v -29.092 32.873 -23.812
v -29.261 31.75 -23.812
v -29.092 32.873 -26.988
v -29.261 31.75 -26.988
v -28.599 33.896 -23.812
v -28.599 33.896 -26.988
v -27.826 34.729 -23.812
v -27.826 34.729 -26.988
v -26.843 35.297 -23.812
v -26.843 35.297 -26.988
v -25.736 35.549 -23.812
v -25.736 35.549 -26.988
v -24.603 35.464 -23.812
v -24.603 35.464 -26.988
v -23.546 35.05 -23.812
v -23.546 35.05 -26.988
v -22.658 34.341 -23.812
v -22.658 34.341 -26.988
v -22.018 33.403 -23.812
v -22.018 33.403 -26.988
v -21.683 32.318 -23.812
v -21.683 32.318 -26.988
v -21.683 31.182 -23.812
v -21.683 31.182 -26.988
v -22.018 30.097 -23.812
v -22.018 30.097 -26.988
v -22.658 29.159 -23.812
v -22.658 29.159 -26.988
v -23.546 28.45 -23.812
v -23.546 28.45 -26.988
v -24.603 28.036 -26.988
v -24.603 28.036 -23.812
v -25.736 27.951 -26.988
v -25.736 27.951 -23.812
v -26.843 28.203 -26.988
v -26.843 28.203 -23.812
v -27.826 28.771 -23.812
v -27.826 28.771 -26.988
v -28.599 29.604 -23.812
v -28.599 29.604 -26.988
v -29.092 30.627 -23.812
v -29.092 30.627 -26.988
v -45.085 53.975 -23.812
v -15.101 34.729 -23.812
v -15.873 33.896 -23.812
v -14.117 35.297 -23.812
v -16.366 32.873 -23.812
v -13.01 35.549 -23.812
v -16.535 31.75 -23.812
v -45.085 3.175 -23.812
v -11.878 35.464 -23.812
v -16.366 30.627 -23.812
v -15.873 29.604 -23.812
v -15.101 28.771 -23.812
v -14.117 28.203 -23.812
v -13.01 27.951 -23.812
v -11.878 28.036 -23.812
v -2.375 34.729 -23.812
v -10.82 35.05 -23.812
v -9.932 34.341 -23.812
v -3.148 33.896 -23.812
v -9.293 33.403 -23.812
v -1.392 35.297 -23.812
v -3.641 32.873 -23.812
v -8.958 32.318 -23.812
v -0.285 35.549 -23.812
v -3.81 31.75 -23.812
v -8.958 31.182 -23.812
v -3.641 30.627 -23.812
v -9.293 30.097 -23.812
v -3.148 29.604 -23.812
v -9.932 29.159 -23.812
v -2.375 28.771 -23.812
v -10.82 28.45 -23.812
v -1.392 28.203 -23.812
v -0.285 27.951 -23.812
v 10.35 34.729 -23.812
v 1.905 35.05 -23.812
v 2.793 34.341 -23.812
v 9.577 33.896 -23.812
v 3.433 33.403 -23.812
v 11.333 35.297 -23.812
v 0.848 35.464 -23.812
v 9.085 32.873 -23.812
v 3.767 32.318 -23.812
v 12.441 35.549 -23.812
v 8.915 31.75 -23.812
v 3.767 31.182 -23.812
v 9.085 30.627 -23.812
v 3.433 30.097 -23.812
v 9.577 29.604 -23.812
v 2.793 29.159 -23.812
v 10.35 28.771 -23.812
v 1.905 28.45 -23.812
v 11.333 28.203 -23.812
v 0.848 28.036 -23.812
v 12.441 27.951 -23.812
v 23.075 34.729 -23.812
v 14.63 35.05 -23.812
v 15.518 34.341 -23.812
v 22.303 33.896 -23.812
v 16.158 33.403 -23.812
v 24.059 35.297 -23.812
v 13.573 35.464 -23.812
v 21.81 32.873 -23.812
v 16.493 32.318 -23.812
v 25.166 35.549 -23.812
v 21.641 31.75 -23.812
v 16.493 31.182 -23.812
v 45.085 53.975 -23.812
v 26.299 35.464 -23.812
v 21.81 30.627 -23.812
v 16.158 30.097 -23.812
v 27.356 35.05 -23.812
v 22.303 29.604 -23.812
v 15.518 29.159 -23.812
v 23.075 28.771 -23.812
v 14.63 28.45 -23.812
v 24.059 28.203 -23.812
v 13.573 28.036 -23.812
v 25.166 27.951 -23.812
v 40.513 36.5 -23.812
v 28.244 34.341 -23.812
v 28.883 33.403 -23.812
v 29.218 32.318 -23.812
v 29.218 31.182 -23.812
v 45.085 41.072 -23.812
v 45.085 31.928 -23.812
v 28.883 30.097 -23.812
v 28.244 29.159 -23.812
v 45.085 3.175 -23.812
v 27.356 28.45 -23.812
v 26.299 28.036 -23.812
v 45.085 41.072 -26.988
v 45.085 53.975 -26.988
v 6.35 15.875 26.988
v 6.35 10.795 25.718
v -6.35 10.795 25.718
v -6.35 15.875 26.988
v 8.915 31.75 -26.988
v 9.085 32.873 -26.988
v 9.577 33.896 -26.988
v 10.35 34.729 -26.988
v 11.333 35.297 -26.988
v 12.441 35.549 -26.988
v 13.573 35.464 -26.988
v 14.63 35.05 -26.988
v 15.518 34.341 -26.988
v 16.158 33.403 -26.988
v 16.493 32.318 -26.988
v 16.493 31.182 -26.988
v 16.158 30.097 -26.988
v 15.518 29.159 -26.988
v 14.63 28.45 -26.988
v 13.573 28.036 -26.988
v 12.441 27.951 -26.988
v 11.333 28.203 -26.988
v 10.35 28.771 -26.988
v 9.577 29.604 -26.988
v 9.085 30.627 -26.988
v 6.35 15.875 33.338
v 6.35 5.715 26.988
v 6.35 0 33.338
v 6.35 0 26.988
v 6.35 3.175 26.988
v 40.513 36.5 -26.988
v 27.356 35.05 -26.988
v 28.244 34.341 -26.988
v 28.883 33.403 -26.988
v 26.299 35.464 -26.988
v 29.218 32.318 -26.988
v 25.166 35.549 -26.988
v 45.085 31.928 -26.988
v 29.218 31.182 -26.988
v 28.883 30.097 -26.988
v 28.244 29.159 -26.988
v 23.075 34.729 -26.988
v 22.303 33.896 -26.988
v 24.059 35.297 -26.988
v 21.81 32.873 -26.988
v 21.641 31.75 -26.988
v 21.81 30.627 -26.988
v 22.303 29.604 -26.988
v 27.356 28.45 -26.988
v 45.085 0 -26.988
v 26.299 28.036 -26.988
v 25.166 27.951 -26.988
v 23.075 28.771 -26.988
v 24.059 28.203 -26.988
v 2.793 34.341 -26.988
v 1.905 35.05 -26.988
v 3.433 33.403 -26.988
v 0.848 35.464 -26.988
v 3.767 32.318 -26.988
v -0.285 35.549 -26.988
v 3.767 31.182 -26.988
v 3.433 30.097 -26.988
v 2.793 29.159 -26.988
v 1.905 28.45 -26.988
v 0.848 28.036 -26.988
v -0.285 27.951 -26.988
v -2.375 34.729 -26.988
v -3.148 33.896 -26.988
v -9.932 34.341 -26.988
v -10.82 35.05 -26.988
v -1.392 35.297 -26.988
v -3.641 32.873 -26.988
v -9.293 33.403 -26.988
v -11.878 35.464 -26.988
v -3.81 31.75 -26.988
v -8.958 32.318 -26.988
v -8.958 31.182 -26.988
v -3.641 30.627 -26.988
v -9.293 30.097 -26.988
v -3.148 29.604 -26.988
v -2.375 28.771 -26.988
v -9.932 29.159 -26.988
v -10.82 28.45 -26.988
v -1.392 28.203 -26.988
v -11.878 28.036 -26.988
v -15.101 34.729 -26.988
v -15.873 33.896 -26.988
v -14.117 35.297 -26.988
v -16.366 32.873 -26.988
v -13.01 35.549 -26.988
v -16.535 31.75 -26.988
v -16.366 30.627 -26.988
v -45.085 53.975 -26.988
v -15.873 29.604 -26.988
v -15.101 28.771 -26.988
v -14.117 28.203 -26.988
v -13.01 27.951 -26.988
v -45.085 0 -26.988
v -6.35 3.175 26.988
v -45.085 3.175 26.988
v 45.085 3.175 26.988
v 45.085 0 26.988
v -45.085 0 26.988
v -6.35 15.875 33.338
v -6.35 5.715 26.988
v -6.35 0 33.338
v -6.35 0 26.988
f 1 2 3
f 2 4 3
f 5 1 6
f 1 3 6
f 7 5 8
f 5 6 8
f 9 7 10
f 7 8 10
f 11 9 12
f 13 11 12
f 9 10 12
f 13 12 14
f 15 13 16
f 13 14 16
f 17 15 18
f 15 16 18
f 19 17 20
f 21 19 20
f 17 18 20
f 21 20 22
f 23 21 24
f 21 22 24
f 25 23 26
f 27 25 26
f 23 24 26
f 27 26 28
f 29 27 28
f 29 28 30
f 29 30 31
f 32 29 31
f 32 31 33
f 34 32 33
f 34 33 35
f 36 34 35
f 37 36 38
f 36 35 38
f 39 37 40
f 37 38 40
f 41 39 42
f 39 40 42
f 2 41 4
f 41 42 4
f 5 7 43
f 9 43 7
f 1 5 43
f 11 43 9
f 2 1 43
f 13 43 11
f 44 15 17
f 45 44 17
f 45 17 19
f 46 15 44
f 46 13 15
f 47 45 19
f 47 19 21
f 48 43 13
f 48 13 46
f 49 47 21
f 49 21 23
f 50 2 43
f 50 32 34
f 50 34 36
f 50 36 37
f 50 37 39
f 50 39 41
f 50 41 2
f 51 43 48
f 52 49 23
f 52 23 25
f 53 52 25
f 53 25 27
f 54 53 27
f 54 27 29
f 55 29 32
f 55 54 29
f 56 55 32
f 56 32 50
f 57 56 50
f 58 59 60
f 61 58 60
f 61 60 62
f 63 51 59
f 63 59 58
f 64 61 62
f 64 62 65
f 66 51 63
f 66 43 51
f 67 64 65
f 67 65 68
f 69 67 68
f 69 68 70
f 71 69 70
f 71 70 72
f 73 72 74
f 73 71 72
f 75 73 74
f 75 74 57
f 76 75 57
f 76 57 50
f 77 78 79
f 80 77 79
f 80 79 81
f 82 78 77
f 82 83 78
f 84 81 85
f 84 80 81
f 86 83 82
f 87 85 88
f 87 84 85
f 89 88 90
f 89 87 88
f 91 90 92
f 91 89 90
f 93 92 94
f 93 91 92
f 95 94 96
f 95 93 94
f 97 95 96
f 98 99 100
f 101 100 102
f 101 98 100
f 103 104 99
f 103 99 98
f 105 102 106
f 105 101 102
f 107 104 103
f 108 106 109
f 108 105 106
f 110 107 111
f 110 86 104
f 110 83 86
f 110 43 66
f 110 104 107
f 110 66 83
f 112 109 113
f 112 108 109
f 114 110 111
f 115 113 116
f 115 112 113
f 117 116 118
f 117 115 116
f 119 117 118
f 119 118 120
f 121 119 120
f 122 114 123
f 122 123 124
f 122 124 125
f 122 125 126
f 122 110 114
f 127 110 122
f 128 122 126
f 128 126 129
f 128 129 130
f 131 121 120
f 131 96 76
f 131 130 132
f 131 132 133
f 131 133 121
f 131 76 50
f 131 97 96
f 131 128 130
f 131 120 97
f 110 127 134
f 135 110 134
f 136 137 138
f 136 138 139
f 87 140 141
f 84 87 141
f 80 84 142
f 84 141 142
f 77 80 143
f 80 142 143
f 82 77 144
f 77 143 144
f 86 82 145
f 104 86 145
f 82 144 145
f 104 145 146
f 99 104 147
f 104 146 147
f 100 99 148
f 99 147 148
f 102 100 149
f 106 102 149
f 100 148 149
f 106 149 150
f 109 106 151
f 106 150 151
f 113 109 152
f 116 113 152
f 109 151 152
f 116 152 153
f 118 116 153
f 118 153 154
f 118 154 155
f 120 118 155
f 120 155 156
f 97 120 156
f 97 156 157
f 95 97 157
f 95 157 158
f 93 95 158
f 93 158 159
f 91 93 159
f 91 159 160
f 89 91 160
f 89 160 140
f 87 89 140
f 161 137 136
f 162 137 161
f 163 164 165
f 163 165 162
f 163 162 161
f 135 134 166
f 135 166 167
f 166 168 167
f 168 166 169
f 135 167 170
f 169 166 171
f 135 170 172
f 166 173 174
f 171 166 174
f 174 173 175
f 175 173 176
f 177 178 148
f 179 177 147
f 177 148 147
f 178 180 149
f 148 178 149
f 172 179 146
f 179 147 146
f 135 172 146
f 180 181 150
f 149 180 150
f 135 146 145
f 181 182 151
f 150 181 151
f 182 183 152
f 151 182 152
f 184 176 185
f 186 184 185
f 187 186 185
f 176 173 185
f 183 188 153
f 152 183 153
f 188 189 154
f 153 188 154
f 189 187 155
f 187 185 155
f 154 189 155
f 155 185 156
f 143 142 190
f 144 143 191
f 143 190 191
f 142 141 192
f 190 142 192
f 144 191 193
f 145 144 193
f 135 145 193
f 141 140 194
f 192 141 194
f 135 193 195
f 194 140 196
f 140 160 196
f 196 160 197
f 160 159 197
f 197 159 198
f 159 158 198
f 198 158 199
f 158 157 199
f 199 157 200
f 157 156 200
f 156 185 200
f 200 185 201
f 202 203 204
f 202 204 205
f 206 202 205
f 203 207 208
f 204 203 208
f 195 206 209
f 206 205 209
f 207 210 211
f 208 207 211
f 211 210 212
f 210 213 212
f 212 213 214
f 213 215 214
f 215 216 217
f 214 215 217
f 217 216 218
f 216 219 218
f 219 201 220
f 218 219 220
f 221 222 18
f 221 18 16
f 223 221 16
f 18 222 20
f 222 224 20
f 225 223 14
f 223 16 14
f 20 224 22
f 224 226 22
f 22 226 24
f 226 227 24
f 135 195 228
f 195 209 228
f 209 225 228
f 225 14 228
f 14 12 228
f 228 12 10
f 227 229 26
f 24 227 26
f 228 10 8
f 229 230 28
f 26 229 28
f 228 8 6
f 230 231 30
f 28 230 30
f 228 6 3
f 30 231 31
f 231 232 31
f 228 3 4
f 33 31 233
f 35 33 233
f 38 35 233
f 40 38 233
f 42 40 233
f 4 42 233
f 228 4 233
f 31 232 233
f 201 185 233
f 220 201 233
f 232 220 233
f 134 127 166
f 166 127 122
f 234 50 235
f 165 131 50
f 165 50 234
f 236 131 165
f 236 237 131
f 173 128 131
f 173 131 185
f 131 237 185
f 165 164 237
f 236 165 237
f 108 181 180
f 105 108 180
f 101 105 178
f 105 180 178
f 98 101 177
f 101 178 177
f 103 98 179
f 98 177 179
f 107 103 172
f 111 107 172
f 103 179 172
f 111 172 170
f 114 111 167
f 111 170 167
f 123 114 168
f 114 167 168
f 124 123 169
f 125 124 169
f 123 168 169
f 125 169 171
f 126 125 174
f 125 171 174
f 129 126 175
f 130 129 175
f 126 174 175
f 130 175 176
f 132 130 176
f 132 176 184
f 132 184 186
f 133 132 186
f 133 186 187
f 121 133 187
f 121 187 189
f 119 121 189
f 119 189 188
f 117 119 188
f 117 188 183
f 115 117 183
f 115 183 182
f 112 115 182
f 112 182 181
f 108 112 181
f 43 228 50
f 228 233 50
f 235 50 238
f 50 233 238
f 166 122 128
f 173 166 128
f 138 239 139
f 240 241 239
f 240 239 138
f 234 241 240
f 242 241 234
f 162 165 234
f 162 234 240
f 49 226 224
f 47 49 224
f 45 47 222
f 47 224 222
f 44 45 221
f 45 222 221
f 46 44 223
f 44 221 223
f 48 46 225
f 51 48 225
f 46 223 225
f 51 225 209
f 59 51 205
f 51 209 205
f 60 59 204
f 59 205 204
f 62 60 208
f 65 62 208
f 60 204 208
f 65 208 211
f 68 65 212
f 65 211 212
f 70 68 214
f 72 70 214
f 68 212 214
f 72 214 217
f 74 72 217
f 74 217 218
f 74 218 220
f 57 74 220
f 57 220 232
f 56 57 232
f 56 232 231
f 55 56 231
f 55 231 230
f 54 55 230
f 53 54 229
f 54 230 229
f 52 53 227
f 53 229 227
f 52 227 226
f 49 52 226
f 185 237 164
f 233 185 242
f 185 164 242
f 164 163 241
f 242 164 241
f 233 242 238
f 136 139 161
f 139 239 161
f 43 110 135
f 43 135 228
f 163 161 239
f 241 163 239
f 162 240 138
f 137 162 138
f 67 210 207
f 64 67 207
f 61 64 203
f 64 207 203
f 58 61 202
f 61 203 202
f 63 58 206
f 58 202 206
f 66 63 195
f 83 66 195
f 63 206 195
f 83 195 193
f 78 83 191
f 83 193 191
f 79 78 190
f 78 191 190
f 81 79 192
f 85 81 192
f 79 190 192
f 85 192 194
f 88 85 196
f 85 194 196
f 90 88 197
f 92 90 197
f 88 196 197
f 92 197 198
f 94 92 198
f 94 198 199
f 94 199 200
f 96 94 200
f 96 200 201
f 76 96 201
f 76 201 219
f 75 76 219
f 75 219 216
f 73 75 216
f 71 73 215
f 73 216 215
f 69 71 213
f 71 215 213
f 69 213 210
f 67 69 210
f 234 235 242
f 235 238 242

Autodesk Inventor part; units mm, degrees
ref_plane "YZ Plane" through (0, 0, 0) normal (1, 0, 0) x (0, 1, 0)
ref_plane "XZ Plane" through (0, 0, 0) normal (0, 1, 0) x (-1, 0, 0)
ref_plane "XY Plane" through (0, 0, 0) normal (0, 0, 1) x (1, 0, 0)
sketch "Sketch1" plane through (0, 0, 0) normal (0, 1, 0) x (-1, 0, 0)
  line L0 (45.085, 26.9875) -> (-45.085, 26.9875)
  line L1 (-45.085, 26.9875) -> (-45.085, -26.9875)
  line L2 (-45.085, -26.9875) -> (45.085, -26.9875)
  line L3 (45.085, -26.9875) -> (45.085, 26.9875)
  point P0 (0, 0)
  dimension "d0" = 90.17
  dimension "d1" = 45.085
  dimension "d2" = 53.975
  dimension "d3" = 26.9875
extrude "Extrusion1" add sketch "Sketch1" along normal blind 53.975
sketch "Sketch2" plane through (45.085, 0, 26.9875) normal (1, 0, 0) x (0, 0, -1)
  line L0 (0, 53.975) -> (53.975, 53.975) projected
  line L1 (0, 53.975) -> (50.8, 53.975)
  line L2 (50.8, 53.975) -> (50.8, 3.175)
  line L3 (50.8, 3.175) -> (0, 3.175)
  line L4 (0, 3.175) -> (0, 53.975)
  line L5 (0, 0) -> (53.975, 0) projected
  line L6 (53.975, 0) -> (53.975, 53.975) projected
  point P0 (26.9875, 0)
  dimension "d6" = 3.175
  dimension "d7" = 3.175
extrude "Extrusion2" cut sketch "Sketch2" against normal through all
sketch "Sketch3" plane through (0, 0, 0) normal (0, -1, 0) x (1, 0, 0)
  line L0 (-6.35, 23.8125) -> (6.35, 23.8125)
  line L1 (6.35, 23.8125) -> (6.35, 33.3375)
  line L2 (6.35, 33.3375) -> (-6.35, 33.3375)
  line L3 (-6.35, 33.3375) -> (-6.35, 23.8125)
  line L4 (1.9102, 23.8125) -> (1.9102, 26.9875) construction
  line L5 (-45.085, 26.9875) -> (45.085, 26.9875) projected
  point P0 (0, 0)
  dimension "d10" = 12.7
  dimension "d11" = 9.525
  dimension "d12" = 3.175
  dimension "d13" = 6.35
extrude "Extrusion3" add sketch "Sketch3" against normal blind 15.875
sketch "Sketch4" plane through (6.35, 0, 33.3375) normal (1, 0, 0) x (0, 0, -1)
  line L0 (9.525, 3.175) -> (6.35, 3.175) projected
  line L1 (9.525, 3.175) -> (9.525, 15.875) projected
  line L2 (0, 15.875) -> (9.525, 15.875) projected
  line L3 (6.35, 0) -> (6.35, 3.175) projected
  line L4 (6.35, 3.175) -> (6.35, 5.715)
  line L5 (6.35, 5.715) -> (6.35, 15.875) construction
  line L6 (6.35, 5.715) -> (7.62, 10.795)
  line L7 (7.62, 10.795) -> (6.35, 15.875)
  point P0 (33.3375, 0)
  dimension "d19" = 1.27
  dimension "d20" = 10.16
extrude "Extrusion4" cut sketch "Sketch4" against normal blind 15.875
sketch "Sketch5" plane through (45.085, 0, -26.9875) normal (0, 0, -1) x (-1, 0, 0)
  line L0 (19.6342, 31.75) -> (32.3596, 31.75) construction
  line L1 (32.3596, 31.75) -> (45.085, 31.75) construction
  line L2 (45.085, 31.75) -> (57.8104, 31.75) construction
  line L3 (57.8104, 31.75) -> (70.5358, 31.75) construction
  circle A0 centre (19.6342, 31.75) radius 3.81
  circle A1 centre (32.3596, 31.75) radius 3.81
  circle A2 centre (45.085, 31.75) radius 3.81
  circle A3 centre (57.8104, 31.75) radius 3.81
  circle A4 centre (70.5358, 31.75) radius 3.81
  line L4 (19.6342, 31.75) -> (5.2747, 31.75) construction
  line L5 (70.5358, 31.75) -> (84.8953, 31.75) construction
  line L6 (0, 53.975) -> (90.17, 53.975) projected
  point P0 (45.085, 0)
  point P1 (86.995, 3.175)
  point P2 (3.175, 3.175)
  dimension "d23" = 12.7254
  dimension "d24" = 7.62
  dimension "d26" = 22.225
extrude "Extrusion5" cut sketch "Sketch5" against normal blind 15.875
sketch "Sketch6" plane through (45.085, 3.175, -23.8125) normal (0, 0, 1) x (1, 0, 0)
  line L0 (0, 37.8968) -> (-4.572, 33.3248)
  line L1 (-4.572, 33.3248) -> (0, 28.7528)
  line L2 (0, 50.8) -> (-90.17, 50.8) projected
  line L3 (0, 37.8968) -> (0, 50.8)
  line L4 (0, 28.7528) -> (0, 25.3386)
  line L5 (0, 50.8) -> (0, 0) projected
  point P0 (-45.085, -3.175)
  dimension "d31" = 12.9032
  dimension "d32" = 45
  dimension "d33" = 45
  dimension "d35" = 4.572
extrude "Extrusion6" cut sketch "Sketch6" against normal blind 25.4
equation "\"d1\" = 0.5 * d0"
equation "\"d3\" = 0.5 * d2"
equation "\"d13\" = 0.5 * d10"
properties part number "PCB_Case02B"
